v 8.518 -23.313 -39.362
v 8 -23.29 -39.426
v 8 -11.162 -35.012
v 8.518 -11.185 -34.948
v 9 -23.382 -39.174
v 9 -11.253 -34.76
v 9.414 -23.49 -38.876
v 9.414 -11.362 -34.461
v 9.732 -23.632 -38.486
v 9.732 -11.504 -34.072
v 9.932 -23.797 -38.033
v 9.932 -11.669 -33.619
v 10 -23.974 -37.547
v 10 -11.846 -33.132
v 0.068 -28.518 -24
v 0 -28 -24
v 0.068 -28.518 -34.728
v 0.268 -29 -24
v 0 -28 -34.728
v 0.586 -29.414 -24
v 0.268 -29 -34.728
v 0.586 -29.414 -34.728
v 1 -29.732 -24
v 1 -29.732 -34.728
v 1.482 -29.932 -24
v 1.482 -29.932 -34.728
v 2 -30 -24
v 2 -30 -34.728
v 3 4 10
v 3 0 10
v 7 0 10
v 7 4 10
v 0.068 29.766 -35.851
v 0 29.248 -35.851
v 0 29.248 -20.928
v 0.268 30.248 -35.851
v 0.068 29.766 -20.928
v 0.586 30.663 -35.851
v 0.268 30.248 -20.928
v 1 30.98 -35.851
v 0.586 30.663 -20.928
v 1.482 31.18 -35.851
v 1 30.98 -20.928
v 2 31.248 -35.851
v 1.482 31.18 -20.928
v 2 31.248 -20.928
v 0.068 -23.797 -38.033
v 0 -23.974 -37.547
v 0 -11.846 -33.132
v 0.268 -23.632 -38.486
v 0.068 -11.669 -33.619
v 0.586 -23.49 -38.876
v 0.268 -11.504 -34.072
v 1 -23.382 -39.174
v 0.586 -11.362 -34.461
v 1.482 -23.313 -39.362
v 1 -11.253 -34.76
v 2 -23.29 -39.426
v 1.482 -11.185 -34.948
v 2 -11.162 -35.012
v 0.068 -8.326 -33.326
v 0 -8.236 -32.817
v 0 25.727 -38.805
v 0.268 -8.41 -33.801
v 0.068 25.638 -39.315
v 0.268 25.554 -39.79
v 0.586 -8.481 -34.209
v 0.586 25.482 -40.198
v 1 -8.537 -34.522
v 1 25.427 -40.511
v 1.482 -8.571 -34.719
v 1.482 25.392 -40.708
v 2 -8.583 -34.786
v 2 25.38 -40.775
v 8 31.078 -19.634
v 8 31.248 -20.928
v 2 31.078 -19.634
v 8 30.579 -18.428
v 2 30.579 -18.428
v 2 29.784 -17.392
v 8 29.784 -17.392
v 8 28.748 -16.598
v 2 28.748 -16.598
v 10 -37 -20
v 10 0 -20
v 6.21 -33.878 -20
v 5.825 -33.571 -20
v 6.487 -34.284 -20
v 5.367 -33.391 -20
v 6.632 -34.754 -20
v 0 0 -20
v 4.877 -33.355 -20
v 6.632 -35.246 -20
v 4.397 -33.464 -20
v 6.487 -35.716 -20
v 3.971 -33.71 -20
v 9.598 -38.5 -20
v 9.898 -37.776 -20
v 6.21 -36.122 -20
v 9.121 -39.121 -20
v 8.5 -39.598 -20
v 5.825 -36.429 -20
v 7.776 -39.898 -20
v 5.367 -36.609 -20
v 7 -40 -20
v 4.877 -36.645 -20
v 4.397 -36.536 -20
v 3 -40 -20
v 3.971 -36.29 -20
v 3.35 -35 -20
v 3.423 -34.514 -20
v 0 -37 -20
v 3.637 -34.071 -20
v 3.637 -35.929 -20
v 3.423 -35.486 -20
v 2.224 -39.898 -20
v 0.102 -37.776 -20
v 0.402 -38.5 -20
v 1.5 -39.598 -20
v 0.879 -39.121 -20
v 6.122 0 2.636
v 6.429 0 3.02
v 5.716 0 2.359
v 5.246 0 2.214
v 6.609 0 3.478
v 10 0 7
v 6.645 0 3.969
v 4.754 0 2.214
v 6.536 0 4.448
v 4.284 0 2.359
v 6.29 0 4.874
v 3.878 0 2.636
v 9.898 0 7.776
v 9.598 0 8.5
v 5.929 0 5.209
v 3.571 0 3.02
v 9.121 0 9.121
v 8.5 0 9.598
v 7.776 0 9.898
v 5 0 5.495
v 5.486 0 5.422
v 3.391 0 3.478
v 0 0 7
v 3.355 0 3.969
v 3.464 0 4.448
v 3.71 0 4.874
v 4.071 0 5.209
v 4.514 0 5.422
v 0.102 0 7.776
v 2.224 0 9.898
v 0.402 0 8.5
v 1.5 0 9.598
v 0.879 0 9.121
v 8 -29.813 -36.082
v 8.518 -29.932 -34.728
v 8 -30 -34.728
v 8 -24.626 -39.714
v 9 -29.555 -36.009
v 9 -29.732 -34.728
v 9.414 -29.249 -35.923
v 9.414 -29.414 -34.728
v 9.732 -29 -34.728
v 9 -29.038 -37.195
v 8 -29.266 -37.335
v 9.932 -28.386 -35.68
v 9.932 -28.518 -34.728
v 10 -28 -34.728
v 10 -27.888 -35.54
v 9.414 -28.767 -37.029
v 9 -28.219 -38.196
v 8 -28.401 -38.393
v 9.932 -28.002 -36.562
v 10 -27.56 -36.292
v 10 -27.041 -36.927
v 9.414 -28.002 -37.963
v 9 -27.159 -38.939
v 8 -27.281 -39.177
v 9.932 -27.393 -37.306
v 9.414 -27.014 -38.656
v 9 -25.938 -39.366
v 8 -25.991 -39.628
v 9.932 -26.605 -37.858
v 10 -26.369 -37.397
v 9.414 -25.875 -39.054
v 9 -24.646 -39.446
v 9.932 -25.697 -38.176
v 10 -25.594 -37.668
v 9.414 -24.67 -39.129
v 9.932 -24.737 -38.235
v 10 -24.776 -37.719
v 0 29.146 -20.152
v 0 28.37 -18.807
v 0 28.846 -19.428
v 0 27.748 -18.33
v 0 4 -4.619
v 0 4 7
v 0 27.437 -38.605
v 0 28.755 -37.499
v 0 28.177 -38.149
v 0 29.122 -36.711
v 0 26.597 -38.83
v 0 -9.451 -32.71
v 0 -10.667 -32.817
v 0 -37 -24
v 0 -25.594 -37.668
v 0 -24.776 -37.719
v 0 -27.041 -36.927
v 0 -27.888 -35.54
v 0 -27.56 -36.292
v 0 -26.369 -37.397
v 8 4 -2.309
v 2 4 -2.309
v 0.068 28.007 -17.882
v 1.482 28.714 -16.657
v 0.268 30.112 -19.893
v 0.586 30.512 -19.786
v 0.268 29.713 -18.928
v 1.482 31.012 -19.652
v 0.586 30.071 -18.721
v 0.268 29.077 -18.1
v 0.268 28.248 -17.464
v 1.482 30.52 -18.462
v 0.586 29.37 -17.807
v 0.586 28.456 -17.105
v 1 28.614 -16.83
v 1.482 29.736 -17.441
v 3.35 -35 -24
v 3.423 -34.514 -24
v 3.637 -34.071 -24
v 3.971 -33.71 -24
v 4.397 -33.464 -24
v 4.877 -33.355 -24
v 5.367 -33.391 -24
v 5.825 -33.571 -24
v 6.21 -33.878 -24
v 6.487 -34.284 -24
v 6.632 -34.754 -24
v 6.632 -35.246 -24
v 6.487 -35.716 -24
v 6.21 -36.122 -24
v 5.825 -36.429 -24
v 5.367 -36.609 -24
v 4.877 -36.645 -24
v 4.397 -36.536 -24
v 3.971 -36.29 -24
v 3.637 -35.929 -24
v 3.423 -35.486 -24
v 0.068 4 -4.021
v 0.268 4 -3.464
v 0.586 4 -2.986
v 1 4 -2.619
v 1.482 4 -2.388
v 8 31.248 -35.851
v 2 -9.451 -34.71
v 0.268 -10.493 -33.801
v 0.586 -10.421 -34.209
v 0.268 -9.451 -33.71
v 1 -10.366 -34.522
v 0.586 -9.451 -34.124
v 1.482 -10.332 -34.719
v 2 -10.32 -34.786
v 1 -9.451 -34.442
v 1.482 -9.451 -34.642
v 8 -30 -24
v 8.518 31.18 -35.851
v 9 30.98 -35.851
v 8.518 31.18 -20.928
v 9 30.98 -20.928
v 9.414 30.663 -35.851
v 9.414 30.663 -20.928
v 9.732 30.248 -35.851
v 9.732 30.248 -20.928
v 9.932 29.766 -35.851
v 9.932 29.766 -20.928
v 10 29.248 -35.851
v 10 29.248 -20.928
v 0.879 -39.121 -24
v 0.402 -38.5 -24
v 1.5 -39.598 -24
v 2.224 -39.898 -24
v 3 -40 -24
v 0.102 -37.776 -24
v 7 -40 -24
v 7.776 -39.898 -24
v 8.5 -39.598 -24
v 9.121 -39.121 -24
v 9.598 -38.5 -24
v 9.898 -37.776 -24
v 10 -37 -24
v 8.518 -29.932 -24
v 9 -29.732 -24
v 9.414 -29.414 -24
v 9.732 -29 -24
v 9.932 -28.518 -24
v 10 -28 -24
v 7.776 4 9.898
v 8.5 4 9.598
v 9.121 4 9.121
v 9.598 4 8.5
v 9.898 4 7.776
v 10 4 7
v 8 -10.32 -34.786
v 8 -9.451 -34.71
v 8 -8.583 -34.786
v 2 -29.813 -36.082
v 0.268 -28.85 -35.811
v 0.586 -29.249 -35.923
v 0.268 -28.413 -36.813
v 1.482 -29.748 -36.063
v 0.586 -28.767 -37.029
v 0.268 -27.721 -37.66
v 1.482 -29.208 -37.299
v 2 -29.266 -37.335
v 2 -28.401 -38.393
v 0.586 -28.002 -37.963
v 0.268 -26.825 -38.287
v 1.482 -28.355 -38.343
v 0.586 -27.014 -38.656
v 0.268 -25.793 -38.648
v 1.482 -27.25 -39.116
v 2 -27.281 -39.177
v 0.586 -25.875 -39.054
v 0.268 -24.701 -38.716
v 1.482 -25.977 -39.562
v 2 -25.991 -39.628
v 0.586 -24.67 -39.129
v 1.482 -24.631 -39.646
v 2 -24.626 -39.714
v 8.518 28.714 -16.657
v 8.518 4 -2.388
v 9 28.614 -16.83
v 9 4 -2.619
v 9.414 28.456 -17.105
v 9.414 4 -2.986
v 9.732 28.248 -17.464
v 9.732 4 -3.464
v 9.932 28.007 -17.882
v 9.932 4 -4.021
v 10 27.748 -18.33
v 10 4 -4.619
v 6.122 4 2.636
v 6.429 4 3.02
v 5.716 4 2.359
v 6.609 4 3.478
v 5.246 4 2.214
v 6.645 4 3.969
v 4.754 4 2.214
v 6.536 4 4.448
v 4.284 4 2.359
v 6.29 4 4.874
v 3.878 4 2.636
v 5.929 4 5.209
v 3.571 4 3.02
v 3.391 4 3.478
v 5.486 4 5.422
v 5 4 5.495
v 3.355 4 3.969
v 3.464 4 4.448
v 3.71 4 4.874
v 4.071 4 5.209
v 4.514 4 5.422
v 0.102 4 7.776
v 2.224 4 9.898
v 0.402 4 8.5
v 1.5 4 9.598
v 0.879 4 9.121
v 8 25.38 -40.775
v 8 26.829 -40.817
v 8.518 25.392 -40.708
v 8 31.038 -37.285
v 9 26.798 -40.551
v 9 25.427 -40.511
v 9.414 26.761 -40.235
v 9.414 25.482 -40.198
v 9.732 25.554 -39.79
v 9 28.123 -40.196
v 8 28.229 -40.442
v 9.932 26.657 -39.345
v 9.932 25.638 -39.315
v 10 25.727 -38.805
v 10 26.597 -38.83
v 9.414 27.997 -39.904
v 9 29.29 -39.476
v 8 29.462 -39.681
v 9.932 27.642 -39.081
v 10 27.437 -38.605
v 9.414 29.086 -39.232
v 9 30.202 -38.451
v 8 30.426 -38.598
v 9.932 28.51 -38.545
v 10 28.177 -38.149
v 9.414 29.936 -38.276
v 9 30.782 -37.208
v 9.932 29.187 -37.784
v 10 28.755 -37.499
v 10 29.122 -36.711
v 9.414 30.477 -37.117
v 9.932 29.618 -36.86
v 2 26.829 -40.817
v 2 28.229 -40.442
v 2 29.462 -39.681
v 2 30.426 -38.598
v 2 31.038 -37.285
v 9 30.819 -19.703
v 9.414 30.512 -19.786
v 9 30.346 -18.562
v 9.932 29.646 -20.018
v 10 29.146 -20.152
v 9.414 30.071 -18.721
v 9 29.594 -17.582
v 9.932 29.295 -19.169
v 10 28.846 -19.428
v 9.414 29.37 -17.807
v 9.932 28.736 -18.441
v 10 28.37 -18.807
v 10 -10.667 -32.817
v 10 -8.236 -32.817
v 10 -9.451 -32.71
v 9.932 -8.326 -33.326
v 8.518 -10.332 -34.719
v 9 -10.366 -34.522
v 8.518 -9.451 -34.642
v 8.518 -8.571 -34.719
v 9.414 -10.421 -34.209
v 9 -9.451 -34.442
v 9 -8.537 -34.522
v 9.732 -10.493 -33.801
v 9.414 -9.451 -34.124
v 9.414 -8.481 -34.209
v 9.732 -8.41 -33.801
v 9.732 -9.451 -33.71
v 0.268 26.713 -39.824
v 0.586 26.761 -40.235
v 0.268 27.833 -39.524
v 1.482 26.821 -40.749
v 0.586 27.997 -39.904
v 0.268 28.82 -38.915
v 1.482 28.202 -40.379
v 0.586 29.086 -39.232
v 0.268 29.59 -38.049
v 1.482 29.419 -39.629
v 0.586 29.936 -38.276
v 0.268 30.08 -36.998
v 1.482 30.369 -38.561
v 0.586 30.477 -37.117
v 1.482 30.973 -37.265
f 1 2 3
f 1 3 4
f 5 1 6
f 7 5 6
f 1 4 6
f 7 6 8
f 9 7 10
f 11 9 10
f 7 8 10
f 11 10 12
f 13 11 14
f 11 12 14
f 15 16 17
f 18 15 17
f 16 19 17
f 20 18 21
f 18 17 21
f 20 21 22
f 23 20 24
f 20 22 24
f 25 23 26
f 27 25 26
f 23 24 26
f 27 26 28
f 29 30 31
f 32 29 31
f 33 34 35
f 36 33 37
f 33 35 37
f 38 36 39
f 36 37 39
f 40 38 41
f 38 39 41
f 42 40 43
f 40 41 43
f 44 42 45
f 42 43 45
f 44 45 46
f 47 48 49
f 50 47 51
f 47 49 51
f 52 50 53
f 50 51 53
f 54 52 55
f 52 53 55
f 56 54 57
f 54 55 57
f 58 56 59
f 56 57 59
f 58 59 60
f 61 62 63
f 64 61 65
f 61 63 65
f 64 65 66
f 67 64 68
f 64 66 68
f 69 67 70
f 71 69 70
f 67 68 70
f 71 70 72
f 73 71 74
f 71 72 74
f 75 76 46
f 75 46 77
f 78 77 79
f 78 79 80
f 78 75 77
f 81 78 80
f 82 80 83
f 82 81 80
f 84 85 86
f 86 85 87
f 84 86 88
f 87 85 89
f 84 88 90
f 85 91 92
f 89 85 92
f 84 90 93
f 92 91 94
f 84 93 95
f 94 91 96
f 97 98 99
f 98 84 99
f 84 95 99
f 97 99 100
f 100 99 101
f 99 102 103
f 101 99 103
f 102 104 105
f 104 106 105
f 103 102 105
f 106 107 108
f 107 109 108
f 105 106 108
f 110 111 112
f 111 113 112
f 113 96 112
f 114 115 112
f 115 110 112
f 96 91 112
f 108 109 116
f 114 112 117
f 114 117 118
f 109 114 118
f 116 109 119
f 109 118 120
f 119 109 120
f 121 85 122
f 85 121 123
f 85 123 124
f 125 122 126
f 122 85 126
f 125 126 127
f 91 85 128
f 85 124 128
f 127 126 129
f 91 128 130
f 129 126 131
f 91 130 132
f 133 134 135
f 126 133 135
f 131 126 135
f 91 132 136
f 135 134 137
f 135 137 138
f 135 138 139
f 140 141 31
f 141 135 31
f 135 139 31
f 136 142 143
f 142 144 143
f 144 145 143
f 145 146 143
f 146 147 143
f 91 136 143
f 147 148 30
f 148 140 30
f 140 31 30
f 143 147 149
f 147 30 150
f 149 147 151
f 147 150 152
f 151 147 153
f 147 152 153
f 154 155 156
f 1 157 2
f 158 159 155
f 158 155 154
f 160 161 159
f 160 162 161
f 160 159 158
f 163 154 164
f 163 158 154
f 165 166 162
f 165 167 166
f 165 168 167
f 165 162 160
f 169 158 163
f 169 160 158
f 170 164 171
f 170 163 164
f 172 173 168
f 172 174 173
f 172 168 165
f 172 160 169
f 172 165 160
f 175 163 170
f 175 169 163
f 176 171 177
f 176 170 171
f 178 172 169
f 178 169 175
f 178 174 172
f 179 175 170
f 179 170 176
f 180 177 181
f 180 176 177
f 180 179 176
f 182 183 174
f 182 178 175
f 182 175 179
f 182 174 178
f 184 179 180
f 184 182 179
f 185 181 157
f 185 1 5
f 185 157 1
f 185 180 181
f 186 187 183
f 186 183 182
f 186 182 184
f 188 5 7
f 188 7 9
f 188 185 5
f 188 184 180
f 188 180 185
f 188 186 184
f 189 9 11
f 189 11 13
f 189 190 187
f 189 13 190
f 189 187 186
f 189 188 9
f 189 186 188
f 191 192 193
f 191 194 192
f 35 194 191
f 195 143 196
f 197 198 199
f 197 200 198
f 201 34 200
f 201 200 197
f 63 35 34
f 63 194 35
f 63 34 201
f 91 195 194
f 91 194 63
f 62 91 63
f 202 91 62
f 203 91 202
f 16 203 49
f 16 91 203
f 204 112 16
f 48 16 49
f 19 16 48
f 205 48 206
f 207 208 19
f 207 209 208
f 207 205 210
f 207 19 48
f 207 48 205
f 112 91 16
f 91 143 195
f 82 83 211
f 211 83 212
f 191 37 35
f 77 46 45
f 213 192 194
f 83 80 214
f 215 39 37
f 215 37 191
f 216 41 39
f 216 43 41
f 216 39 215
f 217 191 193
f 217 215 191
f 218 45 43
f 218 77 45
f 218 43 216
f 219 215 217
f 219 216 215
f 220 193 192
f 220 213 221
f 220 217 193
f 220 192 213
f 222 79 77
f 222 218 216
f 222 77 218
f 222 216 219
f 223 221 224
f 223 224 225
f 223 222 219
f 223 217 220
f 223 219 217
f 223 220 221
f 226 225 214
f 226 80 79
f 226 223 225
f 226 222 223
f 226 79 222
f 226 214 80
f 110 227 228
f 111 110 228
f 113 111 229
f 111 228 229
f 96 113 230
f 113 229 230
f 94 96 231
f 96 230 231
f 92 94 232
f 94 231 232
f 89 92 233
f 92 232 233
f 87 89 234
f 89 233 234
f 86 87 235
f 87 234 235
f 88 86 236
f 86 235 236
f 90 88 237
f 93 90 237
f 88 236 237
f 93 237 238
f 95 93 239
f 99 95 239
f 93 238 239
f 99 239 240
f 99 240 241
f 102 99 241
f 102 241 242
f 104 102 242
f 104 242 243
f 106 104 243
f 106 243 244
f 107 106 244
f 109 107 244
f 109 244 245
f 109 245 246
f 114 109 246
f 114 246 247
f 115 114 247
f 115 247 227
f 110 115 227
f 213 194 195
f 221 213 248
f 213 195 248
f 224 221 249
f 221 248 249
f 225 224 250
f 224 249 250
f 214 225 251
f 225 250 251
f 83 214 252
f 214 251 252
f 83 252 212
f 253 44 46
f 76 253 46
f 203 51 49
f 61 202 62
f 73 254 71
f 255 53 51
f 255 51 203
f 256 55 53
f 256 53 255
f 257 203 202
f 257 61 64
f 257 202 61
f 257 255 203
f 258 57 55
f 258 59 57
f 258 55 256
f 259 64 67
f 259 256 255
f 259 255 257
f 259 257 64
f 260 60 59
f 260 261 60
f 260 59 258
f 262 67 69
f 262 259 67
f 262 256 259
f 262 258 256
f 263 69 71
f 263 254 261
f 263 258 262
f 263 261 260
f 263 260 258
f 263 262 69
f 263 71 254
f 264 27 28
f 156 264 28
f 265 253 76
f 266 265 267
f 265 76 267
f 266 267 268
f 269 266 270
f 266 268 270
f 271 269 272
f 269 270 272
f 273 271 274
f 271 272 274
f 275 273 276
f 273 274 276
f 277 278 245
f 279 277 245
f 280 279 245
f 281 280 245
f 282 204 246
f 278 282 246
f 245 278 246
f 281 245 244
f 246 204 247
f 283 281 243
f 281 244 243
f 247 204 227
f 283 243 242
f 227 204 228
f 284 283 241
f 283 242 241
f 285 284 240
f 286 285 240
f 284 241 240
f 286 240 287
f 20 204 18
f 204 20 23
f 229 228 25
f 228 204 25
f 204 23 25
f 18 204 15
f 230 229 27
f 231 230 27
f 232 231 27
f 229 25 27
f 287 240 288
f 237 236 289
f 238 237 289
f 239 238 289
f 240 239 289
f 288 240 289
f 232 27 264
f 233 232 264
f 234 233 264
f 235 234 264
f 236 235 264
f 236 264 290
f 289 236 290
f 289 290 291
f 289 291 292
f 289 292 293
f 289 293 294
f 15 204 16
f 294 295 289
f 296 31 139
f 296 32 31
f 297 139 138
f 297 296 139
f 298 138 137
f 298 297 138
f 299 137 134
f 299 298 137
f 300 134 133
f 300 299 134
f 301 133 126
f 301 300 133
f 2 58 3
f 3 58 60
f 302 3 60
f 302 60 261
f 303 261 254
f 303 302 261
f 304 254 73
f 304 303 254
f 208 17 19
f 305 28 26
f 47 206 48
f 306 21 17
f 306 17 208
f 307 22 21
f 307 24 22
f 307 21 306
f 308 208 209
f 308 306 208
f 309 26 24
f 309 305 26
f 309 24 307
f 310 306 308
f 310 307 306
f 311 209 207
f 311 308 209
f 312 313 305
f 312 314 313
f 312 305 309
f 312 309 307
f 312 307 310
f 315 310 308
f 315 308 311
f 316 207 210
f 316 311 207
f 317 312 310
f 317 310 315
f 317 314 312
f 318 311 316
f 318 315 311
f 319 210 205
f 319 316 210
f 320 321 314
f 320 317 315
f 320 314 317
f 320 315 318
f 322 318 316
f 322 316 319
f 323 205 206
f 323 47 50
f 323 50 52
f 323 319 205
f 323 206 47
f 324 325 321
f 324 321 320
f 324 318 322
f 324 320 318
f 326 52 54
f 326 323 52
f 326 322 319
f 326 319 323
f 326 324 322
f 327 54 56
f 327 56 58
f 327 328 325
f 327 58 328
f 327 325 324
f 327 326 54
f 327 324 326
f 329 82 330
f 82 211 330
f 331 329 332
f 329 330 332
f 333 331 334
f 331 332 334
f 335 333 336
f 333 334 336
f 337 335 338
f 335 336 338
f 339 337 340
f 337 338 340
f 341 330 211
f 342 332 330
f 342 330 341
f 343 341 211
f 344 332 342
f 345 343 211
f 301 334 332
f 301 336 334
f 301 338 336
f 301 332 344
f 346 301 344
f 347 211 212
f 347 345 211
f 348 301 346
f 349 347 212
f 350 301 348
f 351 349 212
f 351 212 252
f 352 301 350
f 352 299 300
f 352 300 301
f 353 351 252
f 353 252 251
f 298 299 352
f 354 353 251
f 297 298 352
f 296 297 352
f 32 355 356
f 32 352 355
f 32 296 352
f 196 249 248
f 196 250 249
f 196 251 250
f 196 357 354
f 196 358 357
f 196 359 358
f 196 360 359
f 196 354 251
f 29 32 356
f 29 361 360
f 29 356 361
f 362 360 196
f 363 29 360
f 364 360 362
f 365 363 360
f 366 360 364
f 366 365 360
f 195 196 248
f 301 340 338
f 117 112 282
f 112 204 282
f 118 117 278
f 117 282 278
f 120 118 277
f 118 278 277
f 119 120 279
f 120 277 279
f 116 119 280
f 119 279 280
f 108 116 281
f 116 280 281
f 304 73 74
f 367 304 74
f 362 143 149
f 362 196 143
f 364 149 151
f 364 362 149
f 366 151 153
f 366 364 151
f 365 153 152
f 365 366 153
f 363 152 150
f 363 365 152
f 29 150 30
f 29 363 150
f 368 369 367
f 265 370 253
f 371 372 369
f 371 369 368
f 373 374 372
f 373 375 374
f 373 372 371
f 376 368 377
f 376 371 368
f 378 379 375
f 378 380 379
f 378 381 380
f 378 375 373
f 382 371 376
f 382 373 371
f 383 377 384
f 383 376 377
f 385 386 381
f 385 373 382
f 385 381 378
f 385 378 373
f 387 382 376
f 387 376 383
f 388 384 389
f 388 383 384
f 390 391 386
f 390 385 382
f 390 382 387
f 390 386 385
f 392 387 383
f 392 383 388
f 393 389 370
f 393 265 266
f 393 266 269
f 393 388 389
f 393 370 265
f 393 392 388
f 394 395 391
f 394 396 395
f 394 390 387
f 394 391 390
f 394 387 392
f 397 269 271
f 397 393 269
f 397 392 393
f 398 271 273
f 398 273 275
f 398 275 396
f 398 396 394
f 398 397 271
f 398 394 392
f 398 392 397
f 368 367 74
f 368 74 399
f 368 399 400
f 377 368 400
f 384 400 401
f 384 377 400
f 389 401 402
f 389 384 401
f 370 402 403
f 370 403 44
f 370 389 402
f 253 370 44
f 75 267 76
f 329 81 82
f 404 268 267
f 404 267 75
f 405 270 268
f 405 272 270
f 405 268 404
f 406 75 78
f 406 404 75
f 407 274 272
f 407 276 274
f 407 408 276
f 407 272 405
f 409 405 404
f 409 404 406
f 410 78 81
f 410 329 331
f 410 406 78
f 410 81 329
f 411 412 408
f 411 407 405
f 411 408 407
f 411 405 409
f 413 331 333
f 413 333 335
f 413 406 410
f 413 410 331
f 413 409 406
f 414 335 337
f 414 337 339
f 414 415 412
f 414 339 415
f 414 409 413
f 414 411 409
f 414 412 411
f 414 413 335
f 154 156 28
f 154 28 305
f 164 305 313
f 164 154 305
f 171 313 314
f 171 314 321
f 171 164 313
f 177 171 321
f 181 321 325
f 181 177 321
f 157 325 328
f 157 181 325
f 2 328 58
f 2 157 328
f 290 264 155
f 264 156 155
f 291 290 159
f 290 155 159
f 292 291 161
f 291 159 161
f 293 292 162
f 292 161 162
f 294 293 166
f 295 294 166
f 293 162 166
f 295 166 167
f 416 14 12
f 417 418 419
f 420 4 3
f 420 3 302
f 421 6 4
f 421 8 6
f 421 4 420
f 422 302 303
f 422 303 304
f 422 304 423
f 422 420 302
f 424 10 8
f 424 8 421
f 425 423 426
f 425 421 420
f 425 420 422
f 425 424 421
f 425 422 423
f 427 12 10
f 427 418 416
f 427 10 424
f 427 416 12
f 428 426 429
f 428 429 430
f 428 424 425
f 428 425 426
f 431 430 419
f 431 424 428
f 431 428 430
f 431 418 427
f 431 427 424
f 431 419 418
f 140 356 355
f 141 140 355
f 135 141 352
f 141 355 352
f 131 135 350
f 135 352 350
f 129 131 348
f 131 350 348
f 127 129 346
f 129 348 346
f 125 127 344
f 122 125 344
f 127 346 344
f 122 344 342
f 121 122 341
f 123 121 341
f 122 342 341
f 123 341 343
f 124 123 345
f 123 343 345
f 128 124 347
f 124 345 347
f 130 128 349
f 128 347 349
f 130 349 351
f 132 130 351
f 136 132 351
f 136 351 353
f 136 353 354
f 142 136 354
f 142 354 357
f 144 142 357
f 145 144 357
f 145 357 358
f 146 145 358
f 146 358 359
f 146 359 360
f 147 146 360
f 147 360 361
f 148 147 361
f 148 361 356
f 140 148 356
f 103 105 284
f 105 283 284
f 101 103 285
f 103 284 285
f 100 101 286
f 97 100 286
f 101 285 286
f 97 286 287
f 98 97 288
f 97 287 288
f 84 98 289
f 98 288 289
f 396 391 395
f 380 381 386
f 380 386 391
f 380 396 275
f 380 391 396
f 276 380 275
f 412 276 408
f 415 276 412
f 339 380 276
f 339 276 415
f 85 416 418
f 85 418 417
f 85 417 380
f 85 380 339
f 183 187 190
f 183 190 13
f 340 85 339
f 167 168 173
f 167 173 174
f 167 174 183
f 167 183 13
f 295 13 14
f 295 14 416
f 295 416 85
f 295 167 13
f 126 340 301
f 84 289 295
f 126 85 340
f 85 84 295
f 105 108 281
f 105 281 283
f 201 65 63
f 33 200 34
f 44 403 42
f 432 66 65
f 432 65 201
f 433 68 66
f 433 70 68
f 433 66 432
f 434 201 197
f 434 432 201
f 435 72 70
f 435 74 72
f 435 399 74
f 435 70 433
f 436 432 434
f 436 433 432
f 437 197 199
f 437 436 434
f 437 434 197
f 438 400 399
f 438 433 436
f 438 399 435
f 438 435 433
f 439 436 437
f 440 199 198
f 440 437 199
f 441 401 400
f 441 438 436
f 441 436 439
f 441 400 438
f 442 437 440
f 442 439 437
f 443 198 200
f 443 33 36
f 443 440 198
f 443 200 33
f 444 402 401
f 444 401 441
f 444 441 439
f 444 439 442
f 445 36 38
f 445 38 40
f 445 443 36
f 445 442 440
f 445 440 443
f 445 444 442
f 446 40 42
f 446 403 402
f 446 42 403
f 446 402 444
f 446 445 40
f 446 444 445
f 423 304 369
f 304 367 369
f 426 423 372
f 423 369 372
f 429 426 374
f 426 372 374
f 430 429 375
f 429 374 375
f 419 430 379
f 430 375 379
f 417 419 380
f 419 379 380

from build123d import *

# Parameters (mm, degrees)
BOSS_EXTRUDE1_DEPTH = 10
FILLET1_R           = 5
BOSS_EXTRUDE2_DEPTH = 4
SKETCH3_R           = 1.65
CUT_EXTRUDE1_DEPTH  = 55.081290223
BOSS_EXTRUDE3_DEPTH = 4
SKETCH5_R           = 1.65
CUT_EXTRUDE2_DEPTH  = 54.441556864
FILLET2_R           = 3
FILLET3_R           = 2


with BuildPart() as part:
    # Sketch1 → Boss-Extrude1 (new body)
    with BuildSketch(Plane(origin=(0, 0, 0), x_dir=(0, 0, -1), z_dir=(1, 0, 0))):
        Polygon((0, 0), (20, 0), (20, -30), (41.868360094, -30), (34.553508963, -9.90261169), (41.809544604, 31.248411326), (18.041278691, 31.248411326), align=None)
    extrude(amount=BOSS_EXTRUDE1_DEPTH)

    # Fillet1
    fillet1_edges = [part.edges().sort_by_distance(p)[0] for p in [
        (5, 31.248411326, -18.041278691),
        (5, 31.248411326, -41.809544604),
        (5, -9.90261169, -34.553508963),
        (5, -30, -41.868360094),
    ]]
    fillet(fillet1_edges, radius=FILLET1_R)

    # Sketch2 → Boss-Extrude2 (add)
    with BuildSketch(Plane.XZ):
        Polygon((0, -20), (0, 0), (0, 10), (10, 10), (10, 0), (10, -20), align=None)
    extrude(amount=-BOSS_EXTRUDE2_DEPTH)

    # Sketch3 → Cut-Extrude1 (cut, through all)
    with BuildSketch(Plane(origin=(0, 4, 0), x_dir=(1, 0, 0), z_dir=(0, 1, 0))):
        with Locations(Location((5, -3.845299462, 0), (0, 0, 270))):
            Circle(SKETCH3_R)
    extrude(amount=-CUT_EXTRUDE1_DEPTH, mode=Mode.SUBTRACT)

    # Sketch4 → Boss-Extrude3 (add)
    with BuildSketch(Plane.XY.offset(-20)):
        Polygon((0, 0), (0, -30), (0, -40), (10, -40), (10, -30), (10, 0), align=None)
    extrude(amount=-BOSS_EXTRUDE3_DEPTH)

    # Sketch5 → Cut-Extrude2 (cut, through all)
    with BuildSketch(Plane(origin=(0, 0, -24), x_dir=(-1, 0, 0), z_dir=(0, 0, -1))):
        with Locations((-5, -35)):
            Circle(SKETCH5_R)
    extrude(amount=-CUT_EXTRUDE2_DEPTH, mode=Mode.SUBTRACT)

    # Fillet2
    fillet2_edges = [part.edges().sort_by_distance(p)[0] for p in [
        (10, 2, 10),
        (0, 2, 10),
        (0, -40, -22),
        (10, -40, -22),
    ]]
    fillet(fillet2_edges, radius=FILLET2_R)

    # Fillet3
    fillet3_edges = [part.edges().sort_by_distance(p)[0] for p in [
        (0, -17.225730184, -37.218906116),
        (10, -17.225730184, -37.218906116),
        (0, 16.374205663, -9.453652047),
        (0, 31.248411326, -28.389403339),
        (0, 8.398475479, -37.780484407),
        (0, 30.578538345, -18.428030037),
        (0, 29.462349374, -39.680998857),
        (0, -27.867882182, -38.823380282),
        (10, 16.374205663, -9.453652047),
        (10, 8.398475479, -37.780484407),
        (10, 31.248411326, -28.389403339),
        (10, 30.578538345, -18.428030037),
        (10, 29.462349374, -39.680998857),
        (10, -27.867882182, -38.823380282),
        (0, -9.887239081, -34.729218682),
        (10, -9.887239081, -34.729218682),
        (0, -30, -29.36381003),
        (10, -30, -29.36381003),
    ]]
    fillet(fillet3_edges, radius=FILLET3_R)


solid = part.part
